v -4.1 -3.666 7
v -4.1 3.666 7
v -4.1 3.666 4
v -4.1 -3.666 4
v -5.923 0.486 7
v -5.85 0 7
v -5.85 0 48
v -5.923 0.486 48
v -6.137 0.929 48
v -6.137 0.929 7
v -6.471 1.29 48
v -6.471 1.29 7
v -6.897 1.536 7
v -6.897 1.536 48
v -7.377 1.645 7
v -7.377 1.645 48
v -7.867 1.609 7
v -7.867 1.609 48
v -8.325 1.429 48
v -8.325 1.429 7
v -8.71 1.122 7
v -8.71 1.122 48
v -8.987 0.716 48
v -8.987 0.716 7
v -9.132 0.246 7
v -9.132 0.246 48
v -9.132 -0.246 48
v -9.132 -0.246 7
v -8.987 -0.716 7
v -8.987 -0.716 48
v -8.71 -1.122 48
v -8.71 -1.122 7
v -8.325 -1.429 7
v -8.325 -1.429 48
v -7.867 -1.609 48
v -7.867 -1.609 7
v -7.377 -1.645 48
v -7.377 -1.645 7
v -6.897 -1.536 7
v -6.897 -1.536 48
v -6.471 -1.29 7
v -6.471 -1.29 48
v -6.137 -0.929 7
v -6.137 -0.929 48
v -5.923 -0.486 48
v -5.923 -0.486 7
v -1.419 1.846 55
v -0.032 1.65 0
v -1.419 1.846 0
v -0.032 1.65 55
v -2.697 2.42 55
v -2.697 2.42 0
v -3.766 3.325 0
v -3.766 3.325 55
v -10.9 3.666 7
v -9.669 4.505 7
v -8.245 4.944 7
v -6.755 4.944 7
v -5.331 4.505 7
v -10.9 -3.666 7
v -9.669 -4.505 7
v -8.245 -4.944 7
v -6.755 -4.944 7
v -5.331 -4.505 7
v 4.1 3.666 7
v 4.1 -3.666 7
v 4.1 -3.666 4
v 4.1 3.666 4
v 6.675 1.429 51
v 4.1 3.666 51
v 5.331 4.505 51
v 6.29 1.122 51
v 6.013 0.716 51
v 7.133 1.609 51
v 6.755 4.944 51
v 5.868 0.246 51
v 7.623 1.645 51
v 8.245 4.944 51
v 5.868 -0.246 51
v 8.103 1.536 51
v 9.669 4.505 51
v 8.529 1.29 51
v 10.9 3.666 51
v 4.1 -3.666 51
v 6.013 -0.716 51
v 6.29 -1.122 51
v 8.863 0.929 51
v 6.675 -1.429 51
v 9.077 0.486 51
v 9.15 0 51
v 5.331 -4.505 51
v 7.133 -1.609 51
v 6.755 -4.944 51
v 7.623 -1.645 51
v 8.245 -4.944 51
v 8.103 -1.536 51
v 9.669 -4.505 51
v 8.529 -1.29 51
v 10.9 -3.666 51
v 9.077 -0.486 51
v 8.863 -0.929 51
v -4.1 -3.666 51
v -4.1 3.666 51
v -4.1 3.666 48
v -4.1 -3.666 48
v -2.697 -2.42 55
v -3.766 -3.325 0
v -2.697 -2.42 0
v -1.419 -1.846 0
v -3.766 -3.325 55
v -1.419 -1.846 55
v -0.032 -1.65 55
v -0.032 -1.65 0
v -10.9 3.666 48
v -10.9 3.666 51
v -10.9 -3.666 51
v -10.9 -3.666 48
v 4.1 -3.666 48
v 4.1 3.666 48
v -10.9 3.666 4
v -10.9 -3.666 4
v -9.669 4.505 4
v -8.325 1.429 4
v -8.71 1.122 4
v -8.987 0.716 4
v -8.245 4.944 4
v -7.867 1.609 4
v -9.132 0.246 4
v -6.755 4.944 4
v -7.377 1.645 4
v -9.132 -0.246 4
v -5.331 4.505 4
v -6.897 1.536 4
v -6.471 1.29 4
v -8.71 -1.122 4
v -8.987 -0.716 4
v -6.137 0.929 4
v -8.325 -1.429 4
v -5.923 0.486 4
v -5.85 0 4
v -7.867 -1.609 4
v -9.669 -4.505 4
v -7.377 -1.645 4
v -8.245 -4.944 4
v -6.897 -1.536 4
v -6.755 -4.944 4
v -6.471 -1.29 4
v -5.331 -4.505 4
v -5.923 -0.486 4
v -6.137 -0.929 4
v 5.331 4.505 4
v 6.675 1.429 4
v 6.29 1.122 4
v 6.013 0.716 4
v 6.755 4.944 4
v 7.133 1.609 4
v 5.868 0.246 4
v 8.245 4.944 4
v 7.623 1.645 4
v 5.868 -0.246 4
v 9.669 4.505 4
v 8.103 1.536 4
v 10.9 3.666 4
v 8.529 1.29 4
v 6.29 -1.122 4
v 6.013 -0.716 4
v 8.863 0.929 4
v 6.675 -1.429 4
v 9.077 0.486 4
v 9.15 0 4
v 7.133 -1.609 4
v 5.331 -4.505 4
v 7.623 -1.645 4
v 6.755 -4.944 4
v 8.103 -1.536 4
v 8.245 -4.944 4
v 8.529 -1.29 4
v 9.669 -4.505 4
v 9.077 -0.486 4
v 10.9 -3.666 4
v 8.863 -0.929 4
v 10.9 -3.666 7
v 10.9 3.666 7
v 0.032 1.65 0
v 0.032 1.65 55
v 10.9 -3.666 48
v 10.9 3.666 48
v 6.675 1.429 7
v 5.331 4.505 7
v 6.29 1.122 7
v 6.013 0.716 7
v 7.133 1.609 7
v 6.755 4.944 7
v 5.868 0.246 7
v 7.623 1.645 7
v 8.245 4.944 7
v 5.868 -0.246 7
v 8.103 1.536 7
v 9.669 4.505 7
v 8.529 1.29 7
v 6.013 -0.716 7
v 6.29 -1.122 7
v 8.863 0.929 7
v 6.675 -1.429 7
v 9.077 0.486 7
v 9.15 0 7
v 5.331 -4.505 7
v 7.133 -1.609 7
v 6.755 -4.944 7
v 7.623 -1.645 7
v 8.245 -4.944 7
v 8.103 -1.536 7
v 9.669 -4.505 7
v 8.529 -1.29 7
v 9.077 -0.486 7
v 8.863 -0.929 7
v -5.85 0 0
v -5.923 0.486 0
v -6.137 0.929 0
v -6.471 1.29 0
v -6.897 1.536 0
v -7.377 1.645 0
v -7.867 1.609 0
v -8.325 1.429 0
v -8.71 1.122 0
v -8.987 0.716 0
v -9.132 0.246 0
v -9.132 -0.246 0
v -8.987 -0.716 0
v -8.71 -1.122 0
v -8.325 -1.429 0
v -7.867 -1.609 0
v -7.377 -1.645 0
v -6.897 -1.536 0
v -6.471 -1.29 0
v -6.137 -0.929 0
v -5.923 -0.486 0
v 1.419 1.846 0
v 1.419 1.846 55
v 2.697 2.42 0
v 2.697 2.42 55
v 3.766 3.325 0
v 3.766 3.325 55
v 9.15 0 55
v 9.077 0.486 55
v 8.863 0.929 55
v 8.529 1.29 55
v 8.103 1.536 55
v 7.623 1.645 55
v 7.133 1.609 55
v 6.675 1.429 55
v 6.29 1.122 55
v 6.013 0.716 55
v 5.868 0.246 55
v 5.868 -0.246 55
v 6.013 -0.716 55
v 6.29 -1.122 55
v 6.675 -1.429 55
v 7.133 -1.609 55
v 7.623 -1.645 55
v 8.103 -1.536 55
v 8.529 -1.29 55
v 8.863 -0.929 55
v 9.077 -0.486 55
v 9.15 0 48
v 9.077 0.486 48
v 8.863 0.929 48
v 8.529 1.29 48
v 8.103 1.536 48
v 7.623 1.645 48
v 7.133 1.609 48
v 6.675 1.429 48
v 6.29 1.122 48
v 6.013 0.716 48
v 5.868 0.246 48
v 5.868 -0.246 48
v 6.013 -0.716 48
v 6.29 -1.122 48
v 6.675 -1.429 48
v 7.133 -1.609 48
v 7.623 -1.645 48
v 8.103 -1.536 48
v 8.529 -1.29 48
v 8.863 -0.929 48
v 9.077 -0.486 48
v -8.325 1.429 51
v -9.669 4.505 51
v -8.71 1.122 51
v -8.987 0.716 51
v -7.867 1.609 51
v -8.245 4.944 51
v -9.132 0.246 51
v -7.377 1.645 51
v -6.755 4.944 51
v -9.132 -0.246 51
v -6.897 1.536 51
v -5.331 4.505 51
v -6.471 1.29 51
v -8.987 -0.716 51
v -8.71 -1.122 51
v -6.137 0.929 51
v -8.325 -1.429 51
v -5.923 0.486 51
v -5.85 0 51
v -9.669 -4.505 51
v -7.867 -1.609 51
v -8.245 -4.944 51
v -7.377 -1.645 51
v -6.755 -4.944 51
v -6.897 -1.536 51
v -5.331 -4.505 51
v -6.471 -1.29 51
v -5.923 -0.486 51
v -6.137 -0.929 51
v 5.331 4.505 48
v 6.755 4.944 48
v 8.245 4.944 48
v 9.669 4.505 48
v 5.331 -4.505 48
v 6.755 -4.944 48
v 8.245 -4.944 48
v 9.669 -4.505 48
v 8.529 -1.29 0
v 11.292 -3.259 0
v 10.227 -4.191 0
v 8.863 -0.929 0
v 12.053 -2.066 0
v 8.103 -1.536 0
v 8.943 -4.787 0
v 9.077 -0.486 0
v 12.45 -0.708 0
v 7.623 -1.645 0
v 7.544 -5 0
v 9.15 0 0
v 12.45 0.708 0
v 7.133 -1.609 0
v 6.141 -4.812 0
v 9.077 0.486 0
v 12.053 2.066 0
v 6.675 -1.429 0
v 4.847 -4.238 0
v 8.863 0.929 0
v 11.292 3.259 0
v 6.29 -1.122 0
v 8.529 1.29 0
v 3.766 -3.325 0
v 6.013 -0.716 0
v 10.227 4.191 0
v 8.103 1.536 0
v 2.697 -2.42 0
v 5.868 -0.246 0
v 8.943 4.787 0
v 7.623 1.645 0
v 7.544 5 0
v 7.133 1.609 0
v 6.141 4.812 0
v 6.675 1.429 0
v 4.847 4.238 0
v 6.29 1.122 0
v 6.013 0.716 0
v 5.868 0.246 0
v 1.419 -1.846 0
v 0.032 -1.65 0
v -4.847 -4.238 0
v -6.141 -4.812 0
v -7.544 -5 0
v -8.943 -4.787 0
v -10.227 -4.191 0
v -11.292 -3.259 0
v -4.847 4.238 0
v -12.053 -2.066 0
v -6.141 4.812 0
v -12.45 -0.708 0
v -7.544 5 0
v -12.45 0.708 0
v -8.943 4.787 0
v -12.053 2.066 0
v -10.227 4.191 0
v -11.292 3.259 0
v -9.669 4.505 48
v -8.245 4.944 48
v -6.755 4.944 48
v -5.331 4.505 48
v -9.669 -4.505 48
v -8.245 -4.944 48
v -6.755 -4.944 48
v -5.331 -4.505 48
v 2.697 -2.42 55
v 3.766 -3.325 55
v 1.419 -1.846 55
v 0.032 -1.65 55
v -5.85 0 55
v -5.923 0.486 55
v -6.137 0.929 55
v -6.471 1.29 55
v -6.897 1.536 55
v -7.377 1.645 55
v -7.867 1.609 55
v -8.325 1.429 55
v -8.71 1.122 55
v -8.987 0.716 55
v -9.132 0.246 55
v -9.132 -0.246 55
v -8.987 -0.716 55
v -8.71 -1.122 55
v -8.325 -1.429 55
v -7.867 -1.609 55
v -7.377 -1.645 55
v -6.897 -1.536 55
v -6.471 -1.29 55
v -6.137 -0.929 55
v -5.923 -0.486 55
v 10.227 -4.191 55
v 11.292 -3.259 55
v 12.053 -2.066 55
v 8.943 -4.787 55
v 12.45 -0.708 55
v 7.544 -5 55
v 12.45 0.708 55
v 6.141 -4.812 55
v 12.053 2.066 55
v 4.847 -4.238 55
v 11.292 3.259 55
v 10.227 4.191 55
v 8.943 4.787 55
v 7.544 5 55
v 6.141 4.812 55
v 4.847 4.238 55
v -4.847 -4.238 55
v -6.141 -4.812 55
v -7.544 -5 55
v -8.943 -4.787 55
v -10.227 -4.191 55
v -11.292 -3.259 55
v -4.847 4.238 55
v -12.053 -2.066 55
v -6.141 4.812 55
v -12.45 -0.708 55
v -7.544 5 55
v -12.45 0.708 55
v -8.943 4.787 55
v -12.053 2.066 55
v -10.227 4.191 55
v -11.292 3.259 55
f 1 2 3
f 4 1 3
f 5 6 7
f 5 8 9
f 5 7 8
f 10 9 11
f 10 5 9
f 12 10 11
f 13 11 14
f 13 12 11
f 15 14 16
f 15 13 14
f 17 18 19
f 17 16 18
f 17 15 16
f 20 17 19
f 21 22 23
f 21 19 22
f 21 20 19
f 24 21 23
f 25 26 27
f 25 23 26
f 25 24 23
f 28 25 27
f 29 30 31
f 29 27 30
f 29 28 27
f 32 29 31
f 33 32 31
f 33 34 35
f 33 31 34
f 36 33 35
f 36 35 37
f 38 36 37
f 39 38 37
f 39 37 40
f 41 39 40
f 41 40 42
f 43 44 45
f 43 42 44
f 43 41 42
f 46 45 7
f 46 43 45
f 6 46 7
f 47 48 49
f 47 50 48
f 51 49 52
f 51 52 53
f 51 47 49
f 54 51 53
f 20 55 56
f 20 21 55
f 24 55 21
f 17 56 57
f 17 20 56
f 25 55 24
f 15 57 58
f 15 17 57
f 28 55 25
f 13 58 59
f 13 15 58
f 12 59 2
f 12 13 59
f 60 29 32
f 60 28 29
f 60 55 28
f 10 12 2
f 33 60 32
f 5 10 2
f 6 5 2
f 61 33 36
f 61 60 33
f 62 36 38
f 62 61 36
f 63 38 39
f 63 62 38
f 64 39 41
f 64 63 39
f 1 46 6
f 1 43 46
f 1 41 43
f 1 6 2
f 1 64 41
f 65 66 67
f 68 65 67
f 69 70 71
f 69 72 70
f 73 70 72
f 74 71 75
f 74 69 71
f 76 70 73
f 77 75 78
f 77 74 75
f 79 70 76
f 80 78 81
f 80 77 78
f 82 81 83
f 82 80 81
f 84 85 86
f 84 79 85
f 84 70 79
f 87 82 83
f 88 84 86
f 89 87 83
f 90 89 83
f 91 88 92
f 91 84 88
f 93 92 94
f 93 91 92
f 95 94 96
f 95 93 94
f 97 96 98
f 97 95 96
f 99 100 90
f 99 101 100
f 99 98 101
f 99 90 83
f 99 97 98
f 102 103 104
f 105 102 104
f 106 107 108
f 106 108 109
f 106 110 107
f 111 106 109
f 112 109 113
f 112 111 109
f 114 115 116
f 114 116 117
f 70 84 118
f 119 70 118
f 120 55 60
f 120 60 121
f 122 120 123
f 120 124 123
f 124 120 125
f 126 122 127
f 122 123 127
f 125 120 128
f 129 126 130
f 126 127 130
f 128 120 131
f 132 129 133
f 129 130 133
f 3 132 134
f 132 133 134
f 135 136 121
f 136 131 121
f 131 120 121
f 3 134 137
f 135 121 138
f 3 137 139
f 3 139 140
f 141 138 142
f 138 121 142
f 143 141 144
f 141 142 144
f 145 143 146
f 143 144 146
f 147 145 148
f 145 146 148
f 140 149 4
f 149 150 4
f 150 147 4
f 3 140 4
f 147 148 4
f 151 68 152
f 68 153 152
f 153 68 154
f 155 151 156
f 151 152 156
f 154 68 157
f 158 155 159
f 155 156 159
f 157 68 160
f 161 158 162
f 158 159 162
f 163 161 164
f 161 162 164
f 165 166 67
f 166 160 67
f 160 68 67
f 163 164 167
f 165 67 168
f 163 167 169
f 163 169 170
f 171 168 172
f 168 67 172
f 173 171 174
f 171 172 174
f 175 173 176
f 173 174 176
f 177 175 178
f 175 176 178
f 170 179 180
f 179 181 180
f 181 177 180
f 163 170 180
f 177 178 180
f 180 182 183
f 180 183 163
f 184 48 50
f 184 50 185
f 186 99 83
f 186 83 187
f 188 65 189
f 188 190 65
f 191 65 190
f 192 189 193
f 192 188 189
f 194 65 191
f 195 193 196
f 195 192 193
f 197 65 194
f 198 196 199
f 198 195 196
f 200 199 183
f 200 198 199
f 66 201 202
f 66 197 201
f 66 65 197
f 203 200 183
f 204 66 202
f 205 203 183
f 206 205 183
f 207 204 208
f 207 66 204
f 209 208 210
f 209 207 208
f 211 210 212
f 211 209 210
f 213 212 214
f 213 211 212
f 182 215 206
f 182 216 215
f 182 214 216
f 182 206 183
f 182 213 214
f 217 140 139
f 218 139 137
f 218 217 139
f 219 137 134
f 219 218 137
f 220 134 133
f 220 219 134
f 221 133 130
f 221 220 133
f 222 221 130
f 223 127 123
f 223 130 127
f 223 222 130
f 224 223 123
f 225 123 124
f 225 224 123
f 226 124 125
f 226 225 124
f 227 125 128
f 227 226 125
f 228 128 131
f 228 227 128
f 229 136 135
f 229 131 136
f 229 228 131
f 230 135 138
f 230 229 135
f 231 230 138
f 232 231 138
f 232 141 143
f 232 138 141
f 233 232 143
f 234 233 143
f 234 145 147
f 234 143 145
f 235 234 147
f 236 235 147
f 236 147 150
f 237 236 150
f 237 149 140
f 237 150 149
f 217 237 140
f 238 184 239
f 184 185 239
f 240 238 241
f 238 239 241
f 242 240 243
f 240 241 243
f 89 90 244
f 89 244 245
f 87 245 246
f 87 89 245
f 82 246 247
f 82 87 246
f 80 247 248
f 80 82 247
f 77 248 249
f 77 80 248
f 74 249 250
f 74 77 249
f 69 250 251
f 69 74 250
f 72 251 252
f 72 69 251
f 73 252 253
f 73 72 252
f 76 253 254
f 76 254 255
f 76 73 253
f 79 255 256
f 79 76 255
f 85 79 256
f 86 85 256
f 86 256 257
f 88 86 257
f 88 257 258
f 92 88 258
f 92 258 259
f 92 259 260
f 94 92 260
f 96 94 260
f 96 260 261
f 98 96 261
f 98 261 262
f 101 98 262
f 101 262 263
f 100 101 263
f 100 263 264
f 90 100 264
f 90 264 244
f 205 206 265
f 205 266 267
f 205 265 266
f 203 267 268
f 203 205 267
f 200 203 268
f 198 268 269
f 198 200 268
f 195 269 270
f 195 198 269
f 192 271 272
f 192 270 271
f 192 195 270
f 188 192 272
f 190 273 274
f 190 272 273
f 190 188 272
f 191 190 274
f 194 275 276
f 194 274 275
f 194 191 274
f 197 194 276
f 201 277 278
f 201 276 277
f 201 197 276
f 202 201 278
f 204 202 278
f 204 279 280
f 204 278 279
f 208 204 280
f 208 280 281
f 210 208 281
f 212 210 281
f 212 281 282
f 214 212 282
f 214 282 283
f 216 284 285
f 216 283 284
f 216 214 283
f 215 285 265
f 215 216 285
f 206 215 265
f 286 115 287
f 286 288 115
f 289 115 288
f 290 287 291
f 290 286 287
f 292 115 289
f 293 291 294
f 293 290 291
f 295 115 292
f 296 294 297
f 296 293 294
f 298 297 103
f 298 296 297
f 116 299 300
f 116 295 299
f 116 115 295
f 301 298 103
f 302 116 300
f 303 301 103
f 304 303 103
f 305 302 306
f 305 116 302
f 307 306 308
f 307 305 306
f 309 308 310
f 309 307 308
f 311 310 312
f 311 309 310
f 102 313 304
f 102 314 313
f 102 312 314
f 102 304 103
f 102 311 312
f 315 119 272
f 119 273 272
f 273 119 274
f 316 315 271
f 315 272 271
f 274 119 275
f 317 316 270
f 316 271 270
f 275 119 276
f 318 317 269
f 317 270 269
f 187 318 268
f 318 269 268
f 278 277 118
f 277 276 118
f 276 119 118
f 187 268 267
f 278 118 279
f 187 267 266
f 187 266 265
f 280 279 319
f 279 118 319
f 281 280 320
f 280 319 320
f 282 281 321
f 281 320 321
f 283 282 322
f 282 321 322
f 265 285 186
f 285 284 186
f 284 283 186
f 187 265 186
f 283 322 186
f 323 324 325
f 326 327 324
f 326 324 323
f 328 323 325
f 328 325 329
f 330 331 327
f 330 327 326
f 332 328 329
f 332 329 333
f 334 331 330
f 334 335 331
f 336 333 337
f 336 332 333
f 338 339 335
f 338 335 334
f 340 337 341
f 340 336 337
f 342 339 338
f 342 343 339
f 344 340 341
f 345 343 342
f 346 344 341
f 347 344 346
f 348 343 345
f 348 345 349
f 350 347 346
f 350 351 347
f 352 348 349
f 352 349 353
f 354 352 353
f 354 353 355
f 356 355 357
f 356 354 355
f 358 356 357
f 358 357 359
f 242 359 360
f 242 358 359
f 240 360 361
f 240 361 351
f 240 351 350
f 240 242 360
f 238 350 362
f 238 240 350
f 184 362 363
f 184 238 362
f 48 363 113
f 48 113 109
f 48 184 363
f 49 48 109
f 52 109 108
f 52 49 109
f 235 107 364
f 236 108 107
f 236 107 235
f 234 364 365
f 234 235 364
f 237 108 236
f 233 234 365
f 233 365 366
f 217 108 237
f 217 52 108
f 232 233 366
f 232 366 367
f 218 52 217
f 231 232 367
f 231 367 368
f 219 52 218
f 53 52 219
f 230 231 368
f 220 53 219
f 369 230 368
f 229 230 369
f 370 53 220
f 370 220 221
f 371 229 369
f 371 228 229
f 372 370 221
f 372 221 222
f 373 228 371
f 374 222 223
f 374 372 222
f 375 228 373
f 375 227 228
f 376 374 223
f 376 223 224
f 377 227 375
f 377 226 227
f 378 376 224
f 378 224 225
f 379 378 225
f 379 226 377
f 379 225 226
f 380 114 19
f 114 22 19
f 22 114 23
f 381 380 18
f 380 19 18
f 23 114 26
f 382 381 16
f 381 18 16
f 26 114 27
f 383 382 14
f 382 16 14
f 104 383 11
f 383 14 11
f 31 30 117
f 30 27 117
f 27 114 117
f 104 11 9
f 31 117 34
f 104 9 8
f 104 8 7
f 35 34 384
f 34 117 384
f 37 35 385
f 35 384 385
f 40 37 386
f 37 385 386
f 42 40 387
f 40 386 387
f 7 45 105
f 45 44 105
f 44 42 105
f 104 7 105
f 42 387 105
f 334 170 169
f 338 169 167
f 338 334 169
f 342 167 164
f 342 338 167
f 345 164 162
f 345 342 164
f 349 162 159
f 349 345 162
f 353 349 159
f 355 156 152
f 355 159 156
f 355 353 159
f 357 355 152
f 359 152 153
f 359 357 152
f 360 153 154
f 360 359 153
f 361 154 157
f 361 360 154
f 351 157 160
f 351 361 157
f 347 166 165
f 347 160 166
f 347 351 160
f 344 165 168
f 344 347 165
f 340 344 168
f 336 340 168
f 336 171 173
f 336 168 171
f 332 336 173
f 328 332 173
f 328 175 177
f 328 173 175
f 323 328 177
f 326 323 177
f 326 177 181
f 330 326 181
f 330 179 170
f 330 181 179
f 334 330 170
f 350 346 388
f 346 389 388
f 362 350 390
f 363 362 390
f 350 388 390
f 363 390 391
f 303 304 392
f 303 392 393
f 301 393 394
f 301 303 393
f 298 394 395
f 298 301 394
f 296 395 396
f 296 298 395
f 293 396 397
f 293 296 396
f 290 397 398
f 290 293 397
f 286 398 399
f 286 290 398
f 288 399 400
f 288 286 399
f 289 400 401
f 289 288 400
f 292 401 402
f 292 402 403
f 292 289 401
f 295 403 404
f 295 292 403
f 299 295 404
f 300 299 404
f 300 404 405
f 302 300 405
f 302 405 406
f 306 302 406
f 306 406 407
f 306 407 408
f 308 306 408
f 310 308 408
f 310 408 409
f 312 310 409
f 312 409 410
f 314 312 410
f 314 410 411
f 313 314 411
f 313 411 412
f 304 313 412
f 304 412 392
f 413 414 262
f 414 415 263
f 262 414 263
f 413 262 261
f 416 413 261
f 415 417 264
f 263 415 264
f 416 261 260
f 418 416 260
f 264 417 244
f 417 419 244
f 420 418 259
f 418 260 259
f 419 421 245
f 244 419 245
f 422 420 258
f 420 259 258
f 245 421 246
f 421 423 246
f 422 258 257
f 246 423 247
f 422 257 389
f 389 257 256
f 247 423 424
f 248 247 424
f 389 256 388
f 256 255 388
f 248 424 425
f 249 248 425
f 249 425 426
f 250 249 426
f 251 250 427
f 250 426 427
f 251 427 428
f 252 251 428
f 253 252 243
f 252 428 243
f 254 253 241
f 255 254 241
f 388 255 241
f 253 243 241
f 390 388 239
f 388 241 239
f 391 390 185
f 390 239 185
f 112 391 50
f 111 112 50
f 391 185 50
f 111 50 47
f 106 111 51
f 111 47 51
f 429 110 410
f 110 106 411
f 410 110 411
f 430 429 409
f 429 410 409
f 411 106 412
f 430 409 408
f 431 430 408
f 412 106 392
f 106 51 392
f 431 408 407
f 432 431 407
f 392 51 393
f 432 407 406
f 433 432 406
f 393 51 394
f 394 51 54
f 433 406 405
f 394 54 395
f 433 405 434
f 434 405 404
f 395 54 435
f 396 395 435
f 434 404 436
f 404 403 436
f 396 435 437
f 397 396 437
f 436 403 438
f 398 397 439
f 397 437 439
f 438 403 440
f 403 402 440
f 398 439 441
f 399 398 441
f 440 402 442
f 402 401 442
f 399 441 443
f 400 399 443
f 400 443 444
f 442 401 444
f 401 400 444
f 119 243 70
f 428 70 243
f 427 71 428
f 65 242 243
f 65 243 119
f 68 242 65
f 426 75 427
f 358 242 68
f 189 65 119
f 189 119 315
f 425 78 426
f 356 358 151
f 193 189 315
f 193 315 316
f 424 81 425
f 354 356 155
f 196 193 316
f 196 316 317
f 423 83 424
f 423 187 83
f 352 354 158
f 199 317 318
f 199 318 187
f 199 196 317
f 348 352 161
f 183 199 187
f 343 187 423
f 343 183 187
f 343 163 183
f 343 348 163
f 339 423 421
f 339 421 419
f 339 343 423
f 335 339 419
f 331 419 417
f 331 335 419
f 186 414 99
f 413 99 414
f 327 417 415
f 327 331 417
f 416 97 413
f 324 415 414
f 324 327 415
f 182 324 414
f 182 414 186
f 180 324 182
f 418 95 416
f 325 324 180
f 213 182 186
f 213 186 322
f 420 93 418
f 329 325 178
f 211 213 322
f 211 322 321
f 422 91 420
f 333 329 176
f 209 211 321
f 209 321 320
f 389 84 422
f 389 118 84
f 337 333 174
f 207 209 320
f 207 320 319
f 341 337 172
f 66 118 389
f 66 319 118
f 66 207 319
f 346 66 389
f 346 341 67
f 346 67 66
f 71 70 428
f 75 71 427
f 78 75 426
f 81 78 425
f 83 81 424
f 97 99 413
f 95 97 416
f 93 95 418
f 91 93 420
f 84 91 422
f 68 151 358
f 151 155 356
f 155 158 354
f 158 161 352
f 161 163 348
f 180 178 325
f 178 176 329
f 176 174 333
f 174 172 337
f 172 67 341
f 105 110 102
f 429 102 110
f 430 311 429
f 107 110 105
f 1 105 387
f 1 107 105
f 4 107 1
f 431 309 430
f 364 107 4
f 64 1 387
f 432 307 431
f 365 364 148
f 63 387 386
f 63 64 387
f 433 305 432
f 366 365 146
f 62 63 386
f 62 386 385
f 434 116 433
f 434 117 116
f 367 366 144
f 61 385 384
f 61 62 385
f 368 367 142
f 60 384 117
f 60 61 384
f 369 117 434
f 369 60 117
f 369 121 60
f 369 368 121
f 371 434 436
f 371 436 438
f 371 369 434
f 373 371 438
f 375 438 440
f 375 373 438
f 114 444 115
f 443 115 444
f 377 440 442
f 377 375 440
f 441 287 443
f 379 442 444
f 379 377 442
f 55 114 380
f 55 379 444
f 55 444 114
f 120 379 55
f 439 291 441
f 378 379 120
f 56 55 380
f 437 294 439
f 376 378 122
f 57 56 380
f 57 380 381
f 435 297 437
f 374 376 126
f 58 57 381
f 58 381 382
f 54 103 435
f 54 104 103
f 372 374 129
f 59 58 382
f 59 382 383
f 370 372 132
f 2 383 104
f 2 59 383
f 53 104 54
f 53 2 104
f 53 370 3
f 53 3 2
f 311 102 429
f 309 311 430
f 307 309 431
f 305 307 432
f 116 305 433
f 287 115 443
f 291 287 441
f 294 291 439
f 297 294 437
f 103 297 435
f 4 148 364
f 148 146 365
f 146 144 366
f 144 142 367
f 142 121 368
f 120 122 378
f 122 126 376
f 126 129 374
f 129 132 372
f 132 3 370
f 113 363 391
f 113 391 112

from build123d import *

# Parameters (mm, degrees)
ESBO_O1_R                  = 1.65
RESSALTO_EXTRUS_O1_DEPTH   = 55
FILETE1_R                  = 5
CORTE_EXTRUS_O1_DEPTH      = 57.623758265
CORTE_EXTRUS_O1_DEPTH_BACK = 57.623758265
ESBO_O2_W                  = 6.8
ESBO_O2_H                  = 3


with BuildPart() as part:
    # Esboço1 → Ressalto-extrusão1 (new body)
    with BuildSketch(Plane.XY):
        with BuildLine():
            Line((-2.78009534, 1.65), (2.78009534, 1.65))
            ThreePointArc((2.78009534, 1.65), (12.5, 0), (2.78009534, -1.65))
            Line((2.78009534, -1.65), (-2.78009534, -1.65))
            ThreePointArc((-2.78009534, -1.65), (-12.5, 0), (-2.78009534, 1.65))
        make_face()
        with Locations((-7.5, 0)):
            Circle(ESBO_O1_R, mode=Mode.SUBTRACT)
        with Locations((7.5, 0)):
            Circle(ESBO_O1_R, mode=Mode.SUBTRACT)
    extrude(amount=RESSALTO_EXTRUS_O1_DEPTH)

    # Filete1
    filete1_edges = [part.edges().sort_by_distance(p)[0] for p in [
        (-2.78009534, 1.65, 27.5),
        (2.78009534, 1.65, 27.5),
        (2.78009534, -1.65, 27.5),
        (-2.78009534, -1.65, 27.5),
    ]]
    fillet(filete1_edges, radius=FILETE1_R)

    # Esboço2 → Corte-extrusão1 (cut, two sides: drawn at the far end of the back side and taken through both)
    with BuildSketch(Plane(origin=(0, 0, 0), x_dir=(1, 0, 0), z_dir=(0, 1, 0)).offset(-CORTE_EXTRUS_O1_DEPTH_BACK)):
        with Locations((-7.5, -5.5)):
            Rectangle(ESBO_O2_W, ESBO_O2_H)
        with Locations((7.5, -5.5)):
            Rectangle(ESBO_O2_W, ESBO_O2_H)
        with Locations((7.5, -49.5)):
            Rectangle(ESBO_O2_W, ESBO_O2_H)
        with Locations((-7.5, -49.5)):
            Rectangle(ESBO_O2_W, ESBO_O2_H)
    extrude(amount=CORTE_EXTRUS_O1_DEPTH + CORTE_EXTRUS_O1_DEPTH_BACK, mode=Mode.SUBTRACT)


solid = part.part
